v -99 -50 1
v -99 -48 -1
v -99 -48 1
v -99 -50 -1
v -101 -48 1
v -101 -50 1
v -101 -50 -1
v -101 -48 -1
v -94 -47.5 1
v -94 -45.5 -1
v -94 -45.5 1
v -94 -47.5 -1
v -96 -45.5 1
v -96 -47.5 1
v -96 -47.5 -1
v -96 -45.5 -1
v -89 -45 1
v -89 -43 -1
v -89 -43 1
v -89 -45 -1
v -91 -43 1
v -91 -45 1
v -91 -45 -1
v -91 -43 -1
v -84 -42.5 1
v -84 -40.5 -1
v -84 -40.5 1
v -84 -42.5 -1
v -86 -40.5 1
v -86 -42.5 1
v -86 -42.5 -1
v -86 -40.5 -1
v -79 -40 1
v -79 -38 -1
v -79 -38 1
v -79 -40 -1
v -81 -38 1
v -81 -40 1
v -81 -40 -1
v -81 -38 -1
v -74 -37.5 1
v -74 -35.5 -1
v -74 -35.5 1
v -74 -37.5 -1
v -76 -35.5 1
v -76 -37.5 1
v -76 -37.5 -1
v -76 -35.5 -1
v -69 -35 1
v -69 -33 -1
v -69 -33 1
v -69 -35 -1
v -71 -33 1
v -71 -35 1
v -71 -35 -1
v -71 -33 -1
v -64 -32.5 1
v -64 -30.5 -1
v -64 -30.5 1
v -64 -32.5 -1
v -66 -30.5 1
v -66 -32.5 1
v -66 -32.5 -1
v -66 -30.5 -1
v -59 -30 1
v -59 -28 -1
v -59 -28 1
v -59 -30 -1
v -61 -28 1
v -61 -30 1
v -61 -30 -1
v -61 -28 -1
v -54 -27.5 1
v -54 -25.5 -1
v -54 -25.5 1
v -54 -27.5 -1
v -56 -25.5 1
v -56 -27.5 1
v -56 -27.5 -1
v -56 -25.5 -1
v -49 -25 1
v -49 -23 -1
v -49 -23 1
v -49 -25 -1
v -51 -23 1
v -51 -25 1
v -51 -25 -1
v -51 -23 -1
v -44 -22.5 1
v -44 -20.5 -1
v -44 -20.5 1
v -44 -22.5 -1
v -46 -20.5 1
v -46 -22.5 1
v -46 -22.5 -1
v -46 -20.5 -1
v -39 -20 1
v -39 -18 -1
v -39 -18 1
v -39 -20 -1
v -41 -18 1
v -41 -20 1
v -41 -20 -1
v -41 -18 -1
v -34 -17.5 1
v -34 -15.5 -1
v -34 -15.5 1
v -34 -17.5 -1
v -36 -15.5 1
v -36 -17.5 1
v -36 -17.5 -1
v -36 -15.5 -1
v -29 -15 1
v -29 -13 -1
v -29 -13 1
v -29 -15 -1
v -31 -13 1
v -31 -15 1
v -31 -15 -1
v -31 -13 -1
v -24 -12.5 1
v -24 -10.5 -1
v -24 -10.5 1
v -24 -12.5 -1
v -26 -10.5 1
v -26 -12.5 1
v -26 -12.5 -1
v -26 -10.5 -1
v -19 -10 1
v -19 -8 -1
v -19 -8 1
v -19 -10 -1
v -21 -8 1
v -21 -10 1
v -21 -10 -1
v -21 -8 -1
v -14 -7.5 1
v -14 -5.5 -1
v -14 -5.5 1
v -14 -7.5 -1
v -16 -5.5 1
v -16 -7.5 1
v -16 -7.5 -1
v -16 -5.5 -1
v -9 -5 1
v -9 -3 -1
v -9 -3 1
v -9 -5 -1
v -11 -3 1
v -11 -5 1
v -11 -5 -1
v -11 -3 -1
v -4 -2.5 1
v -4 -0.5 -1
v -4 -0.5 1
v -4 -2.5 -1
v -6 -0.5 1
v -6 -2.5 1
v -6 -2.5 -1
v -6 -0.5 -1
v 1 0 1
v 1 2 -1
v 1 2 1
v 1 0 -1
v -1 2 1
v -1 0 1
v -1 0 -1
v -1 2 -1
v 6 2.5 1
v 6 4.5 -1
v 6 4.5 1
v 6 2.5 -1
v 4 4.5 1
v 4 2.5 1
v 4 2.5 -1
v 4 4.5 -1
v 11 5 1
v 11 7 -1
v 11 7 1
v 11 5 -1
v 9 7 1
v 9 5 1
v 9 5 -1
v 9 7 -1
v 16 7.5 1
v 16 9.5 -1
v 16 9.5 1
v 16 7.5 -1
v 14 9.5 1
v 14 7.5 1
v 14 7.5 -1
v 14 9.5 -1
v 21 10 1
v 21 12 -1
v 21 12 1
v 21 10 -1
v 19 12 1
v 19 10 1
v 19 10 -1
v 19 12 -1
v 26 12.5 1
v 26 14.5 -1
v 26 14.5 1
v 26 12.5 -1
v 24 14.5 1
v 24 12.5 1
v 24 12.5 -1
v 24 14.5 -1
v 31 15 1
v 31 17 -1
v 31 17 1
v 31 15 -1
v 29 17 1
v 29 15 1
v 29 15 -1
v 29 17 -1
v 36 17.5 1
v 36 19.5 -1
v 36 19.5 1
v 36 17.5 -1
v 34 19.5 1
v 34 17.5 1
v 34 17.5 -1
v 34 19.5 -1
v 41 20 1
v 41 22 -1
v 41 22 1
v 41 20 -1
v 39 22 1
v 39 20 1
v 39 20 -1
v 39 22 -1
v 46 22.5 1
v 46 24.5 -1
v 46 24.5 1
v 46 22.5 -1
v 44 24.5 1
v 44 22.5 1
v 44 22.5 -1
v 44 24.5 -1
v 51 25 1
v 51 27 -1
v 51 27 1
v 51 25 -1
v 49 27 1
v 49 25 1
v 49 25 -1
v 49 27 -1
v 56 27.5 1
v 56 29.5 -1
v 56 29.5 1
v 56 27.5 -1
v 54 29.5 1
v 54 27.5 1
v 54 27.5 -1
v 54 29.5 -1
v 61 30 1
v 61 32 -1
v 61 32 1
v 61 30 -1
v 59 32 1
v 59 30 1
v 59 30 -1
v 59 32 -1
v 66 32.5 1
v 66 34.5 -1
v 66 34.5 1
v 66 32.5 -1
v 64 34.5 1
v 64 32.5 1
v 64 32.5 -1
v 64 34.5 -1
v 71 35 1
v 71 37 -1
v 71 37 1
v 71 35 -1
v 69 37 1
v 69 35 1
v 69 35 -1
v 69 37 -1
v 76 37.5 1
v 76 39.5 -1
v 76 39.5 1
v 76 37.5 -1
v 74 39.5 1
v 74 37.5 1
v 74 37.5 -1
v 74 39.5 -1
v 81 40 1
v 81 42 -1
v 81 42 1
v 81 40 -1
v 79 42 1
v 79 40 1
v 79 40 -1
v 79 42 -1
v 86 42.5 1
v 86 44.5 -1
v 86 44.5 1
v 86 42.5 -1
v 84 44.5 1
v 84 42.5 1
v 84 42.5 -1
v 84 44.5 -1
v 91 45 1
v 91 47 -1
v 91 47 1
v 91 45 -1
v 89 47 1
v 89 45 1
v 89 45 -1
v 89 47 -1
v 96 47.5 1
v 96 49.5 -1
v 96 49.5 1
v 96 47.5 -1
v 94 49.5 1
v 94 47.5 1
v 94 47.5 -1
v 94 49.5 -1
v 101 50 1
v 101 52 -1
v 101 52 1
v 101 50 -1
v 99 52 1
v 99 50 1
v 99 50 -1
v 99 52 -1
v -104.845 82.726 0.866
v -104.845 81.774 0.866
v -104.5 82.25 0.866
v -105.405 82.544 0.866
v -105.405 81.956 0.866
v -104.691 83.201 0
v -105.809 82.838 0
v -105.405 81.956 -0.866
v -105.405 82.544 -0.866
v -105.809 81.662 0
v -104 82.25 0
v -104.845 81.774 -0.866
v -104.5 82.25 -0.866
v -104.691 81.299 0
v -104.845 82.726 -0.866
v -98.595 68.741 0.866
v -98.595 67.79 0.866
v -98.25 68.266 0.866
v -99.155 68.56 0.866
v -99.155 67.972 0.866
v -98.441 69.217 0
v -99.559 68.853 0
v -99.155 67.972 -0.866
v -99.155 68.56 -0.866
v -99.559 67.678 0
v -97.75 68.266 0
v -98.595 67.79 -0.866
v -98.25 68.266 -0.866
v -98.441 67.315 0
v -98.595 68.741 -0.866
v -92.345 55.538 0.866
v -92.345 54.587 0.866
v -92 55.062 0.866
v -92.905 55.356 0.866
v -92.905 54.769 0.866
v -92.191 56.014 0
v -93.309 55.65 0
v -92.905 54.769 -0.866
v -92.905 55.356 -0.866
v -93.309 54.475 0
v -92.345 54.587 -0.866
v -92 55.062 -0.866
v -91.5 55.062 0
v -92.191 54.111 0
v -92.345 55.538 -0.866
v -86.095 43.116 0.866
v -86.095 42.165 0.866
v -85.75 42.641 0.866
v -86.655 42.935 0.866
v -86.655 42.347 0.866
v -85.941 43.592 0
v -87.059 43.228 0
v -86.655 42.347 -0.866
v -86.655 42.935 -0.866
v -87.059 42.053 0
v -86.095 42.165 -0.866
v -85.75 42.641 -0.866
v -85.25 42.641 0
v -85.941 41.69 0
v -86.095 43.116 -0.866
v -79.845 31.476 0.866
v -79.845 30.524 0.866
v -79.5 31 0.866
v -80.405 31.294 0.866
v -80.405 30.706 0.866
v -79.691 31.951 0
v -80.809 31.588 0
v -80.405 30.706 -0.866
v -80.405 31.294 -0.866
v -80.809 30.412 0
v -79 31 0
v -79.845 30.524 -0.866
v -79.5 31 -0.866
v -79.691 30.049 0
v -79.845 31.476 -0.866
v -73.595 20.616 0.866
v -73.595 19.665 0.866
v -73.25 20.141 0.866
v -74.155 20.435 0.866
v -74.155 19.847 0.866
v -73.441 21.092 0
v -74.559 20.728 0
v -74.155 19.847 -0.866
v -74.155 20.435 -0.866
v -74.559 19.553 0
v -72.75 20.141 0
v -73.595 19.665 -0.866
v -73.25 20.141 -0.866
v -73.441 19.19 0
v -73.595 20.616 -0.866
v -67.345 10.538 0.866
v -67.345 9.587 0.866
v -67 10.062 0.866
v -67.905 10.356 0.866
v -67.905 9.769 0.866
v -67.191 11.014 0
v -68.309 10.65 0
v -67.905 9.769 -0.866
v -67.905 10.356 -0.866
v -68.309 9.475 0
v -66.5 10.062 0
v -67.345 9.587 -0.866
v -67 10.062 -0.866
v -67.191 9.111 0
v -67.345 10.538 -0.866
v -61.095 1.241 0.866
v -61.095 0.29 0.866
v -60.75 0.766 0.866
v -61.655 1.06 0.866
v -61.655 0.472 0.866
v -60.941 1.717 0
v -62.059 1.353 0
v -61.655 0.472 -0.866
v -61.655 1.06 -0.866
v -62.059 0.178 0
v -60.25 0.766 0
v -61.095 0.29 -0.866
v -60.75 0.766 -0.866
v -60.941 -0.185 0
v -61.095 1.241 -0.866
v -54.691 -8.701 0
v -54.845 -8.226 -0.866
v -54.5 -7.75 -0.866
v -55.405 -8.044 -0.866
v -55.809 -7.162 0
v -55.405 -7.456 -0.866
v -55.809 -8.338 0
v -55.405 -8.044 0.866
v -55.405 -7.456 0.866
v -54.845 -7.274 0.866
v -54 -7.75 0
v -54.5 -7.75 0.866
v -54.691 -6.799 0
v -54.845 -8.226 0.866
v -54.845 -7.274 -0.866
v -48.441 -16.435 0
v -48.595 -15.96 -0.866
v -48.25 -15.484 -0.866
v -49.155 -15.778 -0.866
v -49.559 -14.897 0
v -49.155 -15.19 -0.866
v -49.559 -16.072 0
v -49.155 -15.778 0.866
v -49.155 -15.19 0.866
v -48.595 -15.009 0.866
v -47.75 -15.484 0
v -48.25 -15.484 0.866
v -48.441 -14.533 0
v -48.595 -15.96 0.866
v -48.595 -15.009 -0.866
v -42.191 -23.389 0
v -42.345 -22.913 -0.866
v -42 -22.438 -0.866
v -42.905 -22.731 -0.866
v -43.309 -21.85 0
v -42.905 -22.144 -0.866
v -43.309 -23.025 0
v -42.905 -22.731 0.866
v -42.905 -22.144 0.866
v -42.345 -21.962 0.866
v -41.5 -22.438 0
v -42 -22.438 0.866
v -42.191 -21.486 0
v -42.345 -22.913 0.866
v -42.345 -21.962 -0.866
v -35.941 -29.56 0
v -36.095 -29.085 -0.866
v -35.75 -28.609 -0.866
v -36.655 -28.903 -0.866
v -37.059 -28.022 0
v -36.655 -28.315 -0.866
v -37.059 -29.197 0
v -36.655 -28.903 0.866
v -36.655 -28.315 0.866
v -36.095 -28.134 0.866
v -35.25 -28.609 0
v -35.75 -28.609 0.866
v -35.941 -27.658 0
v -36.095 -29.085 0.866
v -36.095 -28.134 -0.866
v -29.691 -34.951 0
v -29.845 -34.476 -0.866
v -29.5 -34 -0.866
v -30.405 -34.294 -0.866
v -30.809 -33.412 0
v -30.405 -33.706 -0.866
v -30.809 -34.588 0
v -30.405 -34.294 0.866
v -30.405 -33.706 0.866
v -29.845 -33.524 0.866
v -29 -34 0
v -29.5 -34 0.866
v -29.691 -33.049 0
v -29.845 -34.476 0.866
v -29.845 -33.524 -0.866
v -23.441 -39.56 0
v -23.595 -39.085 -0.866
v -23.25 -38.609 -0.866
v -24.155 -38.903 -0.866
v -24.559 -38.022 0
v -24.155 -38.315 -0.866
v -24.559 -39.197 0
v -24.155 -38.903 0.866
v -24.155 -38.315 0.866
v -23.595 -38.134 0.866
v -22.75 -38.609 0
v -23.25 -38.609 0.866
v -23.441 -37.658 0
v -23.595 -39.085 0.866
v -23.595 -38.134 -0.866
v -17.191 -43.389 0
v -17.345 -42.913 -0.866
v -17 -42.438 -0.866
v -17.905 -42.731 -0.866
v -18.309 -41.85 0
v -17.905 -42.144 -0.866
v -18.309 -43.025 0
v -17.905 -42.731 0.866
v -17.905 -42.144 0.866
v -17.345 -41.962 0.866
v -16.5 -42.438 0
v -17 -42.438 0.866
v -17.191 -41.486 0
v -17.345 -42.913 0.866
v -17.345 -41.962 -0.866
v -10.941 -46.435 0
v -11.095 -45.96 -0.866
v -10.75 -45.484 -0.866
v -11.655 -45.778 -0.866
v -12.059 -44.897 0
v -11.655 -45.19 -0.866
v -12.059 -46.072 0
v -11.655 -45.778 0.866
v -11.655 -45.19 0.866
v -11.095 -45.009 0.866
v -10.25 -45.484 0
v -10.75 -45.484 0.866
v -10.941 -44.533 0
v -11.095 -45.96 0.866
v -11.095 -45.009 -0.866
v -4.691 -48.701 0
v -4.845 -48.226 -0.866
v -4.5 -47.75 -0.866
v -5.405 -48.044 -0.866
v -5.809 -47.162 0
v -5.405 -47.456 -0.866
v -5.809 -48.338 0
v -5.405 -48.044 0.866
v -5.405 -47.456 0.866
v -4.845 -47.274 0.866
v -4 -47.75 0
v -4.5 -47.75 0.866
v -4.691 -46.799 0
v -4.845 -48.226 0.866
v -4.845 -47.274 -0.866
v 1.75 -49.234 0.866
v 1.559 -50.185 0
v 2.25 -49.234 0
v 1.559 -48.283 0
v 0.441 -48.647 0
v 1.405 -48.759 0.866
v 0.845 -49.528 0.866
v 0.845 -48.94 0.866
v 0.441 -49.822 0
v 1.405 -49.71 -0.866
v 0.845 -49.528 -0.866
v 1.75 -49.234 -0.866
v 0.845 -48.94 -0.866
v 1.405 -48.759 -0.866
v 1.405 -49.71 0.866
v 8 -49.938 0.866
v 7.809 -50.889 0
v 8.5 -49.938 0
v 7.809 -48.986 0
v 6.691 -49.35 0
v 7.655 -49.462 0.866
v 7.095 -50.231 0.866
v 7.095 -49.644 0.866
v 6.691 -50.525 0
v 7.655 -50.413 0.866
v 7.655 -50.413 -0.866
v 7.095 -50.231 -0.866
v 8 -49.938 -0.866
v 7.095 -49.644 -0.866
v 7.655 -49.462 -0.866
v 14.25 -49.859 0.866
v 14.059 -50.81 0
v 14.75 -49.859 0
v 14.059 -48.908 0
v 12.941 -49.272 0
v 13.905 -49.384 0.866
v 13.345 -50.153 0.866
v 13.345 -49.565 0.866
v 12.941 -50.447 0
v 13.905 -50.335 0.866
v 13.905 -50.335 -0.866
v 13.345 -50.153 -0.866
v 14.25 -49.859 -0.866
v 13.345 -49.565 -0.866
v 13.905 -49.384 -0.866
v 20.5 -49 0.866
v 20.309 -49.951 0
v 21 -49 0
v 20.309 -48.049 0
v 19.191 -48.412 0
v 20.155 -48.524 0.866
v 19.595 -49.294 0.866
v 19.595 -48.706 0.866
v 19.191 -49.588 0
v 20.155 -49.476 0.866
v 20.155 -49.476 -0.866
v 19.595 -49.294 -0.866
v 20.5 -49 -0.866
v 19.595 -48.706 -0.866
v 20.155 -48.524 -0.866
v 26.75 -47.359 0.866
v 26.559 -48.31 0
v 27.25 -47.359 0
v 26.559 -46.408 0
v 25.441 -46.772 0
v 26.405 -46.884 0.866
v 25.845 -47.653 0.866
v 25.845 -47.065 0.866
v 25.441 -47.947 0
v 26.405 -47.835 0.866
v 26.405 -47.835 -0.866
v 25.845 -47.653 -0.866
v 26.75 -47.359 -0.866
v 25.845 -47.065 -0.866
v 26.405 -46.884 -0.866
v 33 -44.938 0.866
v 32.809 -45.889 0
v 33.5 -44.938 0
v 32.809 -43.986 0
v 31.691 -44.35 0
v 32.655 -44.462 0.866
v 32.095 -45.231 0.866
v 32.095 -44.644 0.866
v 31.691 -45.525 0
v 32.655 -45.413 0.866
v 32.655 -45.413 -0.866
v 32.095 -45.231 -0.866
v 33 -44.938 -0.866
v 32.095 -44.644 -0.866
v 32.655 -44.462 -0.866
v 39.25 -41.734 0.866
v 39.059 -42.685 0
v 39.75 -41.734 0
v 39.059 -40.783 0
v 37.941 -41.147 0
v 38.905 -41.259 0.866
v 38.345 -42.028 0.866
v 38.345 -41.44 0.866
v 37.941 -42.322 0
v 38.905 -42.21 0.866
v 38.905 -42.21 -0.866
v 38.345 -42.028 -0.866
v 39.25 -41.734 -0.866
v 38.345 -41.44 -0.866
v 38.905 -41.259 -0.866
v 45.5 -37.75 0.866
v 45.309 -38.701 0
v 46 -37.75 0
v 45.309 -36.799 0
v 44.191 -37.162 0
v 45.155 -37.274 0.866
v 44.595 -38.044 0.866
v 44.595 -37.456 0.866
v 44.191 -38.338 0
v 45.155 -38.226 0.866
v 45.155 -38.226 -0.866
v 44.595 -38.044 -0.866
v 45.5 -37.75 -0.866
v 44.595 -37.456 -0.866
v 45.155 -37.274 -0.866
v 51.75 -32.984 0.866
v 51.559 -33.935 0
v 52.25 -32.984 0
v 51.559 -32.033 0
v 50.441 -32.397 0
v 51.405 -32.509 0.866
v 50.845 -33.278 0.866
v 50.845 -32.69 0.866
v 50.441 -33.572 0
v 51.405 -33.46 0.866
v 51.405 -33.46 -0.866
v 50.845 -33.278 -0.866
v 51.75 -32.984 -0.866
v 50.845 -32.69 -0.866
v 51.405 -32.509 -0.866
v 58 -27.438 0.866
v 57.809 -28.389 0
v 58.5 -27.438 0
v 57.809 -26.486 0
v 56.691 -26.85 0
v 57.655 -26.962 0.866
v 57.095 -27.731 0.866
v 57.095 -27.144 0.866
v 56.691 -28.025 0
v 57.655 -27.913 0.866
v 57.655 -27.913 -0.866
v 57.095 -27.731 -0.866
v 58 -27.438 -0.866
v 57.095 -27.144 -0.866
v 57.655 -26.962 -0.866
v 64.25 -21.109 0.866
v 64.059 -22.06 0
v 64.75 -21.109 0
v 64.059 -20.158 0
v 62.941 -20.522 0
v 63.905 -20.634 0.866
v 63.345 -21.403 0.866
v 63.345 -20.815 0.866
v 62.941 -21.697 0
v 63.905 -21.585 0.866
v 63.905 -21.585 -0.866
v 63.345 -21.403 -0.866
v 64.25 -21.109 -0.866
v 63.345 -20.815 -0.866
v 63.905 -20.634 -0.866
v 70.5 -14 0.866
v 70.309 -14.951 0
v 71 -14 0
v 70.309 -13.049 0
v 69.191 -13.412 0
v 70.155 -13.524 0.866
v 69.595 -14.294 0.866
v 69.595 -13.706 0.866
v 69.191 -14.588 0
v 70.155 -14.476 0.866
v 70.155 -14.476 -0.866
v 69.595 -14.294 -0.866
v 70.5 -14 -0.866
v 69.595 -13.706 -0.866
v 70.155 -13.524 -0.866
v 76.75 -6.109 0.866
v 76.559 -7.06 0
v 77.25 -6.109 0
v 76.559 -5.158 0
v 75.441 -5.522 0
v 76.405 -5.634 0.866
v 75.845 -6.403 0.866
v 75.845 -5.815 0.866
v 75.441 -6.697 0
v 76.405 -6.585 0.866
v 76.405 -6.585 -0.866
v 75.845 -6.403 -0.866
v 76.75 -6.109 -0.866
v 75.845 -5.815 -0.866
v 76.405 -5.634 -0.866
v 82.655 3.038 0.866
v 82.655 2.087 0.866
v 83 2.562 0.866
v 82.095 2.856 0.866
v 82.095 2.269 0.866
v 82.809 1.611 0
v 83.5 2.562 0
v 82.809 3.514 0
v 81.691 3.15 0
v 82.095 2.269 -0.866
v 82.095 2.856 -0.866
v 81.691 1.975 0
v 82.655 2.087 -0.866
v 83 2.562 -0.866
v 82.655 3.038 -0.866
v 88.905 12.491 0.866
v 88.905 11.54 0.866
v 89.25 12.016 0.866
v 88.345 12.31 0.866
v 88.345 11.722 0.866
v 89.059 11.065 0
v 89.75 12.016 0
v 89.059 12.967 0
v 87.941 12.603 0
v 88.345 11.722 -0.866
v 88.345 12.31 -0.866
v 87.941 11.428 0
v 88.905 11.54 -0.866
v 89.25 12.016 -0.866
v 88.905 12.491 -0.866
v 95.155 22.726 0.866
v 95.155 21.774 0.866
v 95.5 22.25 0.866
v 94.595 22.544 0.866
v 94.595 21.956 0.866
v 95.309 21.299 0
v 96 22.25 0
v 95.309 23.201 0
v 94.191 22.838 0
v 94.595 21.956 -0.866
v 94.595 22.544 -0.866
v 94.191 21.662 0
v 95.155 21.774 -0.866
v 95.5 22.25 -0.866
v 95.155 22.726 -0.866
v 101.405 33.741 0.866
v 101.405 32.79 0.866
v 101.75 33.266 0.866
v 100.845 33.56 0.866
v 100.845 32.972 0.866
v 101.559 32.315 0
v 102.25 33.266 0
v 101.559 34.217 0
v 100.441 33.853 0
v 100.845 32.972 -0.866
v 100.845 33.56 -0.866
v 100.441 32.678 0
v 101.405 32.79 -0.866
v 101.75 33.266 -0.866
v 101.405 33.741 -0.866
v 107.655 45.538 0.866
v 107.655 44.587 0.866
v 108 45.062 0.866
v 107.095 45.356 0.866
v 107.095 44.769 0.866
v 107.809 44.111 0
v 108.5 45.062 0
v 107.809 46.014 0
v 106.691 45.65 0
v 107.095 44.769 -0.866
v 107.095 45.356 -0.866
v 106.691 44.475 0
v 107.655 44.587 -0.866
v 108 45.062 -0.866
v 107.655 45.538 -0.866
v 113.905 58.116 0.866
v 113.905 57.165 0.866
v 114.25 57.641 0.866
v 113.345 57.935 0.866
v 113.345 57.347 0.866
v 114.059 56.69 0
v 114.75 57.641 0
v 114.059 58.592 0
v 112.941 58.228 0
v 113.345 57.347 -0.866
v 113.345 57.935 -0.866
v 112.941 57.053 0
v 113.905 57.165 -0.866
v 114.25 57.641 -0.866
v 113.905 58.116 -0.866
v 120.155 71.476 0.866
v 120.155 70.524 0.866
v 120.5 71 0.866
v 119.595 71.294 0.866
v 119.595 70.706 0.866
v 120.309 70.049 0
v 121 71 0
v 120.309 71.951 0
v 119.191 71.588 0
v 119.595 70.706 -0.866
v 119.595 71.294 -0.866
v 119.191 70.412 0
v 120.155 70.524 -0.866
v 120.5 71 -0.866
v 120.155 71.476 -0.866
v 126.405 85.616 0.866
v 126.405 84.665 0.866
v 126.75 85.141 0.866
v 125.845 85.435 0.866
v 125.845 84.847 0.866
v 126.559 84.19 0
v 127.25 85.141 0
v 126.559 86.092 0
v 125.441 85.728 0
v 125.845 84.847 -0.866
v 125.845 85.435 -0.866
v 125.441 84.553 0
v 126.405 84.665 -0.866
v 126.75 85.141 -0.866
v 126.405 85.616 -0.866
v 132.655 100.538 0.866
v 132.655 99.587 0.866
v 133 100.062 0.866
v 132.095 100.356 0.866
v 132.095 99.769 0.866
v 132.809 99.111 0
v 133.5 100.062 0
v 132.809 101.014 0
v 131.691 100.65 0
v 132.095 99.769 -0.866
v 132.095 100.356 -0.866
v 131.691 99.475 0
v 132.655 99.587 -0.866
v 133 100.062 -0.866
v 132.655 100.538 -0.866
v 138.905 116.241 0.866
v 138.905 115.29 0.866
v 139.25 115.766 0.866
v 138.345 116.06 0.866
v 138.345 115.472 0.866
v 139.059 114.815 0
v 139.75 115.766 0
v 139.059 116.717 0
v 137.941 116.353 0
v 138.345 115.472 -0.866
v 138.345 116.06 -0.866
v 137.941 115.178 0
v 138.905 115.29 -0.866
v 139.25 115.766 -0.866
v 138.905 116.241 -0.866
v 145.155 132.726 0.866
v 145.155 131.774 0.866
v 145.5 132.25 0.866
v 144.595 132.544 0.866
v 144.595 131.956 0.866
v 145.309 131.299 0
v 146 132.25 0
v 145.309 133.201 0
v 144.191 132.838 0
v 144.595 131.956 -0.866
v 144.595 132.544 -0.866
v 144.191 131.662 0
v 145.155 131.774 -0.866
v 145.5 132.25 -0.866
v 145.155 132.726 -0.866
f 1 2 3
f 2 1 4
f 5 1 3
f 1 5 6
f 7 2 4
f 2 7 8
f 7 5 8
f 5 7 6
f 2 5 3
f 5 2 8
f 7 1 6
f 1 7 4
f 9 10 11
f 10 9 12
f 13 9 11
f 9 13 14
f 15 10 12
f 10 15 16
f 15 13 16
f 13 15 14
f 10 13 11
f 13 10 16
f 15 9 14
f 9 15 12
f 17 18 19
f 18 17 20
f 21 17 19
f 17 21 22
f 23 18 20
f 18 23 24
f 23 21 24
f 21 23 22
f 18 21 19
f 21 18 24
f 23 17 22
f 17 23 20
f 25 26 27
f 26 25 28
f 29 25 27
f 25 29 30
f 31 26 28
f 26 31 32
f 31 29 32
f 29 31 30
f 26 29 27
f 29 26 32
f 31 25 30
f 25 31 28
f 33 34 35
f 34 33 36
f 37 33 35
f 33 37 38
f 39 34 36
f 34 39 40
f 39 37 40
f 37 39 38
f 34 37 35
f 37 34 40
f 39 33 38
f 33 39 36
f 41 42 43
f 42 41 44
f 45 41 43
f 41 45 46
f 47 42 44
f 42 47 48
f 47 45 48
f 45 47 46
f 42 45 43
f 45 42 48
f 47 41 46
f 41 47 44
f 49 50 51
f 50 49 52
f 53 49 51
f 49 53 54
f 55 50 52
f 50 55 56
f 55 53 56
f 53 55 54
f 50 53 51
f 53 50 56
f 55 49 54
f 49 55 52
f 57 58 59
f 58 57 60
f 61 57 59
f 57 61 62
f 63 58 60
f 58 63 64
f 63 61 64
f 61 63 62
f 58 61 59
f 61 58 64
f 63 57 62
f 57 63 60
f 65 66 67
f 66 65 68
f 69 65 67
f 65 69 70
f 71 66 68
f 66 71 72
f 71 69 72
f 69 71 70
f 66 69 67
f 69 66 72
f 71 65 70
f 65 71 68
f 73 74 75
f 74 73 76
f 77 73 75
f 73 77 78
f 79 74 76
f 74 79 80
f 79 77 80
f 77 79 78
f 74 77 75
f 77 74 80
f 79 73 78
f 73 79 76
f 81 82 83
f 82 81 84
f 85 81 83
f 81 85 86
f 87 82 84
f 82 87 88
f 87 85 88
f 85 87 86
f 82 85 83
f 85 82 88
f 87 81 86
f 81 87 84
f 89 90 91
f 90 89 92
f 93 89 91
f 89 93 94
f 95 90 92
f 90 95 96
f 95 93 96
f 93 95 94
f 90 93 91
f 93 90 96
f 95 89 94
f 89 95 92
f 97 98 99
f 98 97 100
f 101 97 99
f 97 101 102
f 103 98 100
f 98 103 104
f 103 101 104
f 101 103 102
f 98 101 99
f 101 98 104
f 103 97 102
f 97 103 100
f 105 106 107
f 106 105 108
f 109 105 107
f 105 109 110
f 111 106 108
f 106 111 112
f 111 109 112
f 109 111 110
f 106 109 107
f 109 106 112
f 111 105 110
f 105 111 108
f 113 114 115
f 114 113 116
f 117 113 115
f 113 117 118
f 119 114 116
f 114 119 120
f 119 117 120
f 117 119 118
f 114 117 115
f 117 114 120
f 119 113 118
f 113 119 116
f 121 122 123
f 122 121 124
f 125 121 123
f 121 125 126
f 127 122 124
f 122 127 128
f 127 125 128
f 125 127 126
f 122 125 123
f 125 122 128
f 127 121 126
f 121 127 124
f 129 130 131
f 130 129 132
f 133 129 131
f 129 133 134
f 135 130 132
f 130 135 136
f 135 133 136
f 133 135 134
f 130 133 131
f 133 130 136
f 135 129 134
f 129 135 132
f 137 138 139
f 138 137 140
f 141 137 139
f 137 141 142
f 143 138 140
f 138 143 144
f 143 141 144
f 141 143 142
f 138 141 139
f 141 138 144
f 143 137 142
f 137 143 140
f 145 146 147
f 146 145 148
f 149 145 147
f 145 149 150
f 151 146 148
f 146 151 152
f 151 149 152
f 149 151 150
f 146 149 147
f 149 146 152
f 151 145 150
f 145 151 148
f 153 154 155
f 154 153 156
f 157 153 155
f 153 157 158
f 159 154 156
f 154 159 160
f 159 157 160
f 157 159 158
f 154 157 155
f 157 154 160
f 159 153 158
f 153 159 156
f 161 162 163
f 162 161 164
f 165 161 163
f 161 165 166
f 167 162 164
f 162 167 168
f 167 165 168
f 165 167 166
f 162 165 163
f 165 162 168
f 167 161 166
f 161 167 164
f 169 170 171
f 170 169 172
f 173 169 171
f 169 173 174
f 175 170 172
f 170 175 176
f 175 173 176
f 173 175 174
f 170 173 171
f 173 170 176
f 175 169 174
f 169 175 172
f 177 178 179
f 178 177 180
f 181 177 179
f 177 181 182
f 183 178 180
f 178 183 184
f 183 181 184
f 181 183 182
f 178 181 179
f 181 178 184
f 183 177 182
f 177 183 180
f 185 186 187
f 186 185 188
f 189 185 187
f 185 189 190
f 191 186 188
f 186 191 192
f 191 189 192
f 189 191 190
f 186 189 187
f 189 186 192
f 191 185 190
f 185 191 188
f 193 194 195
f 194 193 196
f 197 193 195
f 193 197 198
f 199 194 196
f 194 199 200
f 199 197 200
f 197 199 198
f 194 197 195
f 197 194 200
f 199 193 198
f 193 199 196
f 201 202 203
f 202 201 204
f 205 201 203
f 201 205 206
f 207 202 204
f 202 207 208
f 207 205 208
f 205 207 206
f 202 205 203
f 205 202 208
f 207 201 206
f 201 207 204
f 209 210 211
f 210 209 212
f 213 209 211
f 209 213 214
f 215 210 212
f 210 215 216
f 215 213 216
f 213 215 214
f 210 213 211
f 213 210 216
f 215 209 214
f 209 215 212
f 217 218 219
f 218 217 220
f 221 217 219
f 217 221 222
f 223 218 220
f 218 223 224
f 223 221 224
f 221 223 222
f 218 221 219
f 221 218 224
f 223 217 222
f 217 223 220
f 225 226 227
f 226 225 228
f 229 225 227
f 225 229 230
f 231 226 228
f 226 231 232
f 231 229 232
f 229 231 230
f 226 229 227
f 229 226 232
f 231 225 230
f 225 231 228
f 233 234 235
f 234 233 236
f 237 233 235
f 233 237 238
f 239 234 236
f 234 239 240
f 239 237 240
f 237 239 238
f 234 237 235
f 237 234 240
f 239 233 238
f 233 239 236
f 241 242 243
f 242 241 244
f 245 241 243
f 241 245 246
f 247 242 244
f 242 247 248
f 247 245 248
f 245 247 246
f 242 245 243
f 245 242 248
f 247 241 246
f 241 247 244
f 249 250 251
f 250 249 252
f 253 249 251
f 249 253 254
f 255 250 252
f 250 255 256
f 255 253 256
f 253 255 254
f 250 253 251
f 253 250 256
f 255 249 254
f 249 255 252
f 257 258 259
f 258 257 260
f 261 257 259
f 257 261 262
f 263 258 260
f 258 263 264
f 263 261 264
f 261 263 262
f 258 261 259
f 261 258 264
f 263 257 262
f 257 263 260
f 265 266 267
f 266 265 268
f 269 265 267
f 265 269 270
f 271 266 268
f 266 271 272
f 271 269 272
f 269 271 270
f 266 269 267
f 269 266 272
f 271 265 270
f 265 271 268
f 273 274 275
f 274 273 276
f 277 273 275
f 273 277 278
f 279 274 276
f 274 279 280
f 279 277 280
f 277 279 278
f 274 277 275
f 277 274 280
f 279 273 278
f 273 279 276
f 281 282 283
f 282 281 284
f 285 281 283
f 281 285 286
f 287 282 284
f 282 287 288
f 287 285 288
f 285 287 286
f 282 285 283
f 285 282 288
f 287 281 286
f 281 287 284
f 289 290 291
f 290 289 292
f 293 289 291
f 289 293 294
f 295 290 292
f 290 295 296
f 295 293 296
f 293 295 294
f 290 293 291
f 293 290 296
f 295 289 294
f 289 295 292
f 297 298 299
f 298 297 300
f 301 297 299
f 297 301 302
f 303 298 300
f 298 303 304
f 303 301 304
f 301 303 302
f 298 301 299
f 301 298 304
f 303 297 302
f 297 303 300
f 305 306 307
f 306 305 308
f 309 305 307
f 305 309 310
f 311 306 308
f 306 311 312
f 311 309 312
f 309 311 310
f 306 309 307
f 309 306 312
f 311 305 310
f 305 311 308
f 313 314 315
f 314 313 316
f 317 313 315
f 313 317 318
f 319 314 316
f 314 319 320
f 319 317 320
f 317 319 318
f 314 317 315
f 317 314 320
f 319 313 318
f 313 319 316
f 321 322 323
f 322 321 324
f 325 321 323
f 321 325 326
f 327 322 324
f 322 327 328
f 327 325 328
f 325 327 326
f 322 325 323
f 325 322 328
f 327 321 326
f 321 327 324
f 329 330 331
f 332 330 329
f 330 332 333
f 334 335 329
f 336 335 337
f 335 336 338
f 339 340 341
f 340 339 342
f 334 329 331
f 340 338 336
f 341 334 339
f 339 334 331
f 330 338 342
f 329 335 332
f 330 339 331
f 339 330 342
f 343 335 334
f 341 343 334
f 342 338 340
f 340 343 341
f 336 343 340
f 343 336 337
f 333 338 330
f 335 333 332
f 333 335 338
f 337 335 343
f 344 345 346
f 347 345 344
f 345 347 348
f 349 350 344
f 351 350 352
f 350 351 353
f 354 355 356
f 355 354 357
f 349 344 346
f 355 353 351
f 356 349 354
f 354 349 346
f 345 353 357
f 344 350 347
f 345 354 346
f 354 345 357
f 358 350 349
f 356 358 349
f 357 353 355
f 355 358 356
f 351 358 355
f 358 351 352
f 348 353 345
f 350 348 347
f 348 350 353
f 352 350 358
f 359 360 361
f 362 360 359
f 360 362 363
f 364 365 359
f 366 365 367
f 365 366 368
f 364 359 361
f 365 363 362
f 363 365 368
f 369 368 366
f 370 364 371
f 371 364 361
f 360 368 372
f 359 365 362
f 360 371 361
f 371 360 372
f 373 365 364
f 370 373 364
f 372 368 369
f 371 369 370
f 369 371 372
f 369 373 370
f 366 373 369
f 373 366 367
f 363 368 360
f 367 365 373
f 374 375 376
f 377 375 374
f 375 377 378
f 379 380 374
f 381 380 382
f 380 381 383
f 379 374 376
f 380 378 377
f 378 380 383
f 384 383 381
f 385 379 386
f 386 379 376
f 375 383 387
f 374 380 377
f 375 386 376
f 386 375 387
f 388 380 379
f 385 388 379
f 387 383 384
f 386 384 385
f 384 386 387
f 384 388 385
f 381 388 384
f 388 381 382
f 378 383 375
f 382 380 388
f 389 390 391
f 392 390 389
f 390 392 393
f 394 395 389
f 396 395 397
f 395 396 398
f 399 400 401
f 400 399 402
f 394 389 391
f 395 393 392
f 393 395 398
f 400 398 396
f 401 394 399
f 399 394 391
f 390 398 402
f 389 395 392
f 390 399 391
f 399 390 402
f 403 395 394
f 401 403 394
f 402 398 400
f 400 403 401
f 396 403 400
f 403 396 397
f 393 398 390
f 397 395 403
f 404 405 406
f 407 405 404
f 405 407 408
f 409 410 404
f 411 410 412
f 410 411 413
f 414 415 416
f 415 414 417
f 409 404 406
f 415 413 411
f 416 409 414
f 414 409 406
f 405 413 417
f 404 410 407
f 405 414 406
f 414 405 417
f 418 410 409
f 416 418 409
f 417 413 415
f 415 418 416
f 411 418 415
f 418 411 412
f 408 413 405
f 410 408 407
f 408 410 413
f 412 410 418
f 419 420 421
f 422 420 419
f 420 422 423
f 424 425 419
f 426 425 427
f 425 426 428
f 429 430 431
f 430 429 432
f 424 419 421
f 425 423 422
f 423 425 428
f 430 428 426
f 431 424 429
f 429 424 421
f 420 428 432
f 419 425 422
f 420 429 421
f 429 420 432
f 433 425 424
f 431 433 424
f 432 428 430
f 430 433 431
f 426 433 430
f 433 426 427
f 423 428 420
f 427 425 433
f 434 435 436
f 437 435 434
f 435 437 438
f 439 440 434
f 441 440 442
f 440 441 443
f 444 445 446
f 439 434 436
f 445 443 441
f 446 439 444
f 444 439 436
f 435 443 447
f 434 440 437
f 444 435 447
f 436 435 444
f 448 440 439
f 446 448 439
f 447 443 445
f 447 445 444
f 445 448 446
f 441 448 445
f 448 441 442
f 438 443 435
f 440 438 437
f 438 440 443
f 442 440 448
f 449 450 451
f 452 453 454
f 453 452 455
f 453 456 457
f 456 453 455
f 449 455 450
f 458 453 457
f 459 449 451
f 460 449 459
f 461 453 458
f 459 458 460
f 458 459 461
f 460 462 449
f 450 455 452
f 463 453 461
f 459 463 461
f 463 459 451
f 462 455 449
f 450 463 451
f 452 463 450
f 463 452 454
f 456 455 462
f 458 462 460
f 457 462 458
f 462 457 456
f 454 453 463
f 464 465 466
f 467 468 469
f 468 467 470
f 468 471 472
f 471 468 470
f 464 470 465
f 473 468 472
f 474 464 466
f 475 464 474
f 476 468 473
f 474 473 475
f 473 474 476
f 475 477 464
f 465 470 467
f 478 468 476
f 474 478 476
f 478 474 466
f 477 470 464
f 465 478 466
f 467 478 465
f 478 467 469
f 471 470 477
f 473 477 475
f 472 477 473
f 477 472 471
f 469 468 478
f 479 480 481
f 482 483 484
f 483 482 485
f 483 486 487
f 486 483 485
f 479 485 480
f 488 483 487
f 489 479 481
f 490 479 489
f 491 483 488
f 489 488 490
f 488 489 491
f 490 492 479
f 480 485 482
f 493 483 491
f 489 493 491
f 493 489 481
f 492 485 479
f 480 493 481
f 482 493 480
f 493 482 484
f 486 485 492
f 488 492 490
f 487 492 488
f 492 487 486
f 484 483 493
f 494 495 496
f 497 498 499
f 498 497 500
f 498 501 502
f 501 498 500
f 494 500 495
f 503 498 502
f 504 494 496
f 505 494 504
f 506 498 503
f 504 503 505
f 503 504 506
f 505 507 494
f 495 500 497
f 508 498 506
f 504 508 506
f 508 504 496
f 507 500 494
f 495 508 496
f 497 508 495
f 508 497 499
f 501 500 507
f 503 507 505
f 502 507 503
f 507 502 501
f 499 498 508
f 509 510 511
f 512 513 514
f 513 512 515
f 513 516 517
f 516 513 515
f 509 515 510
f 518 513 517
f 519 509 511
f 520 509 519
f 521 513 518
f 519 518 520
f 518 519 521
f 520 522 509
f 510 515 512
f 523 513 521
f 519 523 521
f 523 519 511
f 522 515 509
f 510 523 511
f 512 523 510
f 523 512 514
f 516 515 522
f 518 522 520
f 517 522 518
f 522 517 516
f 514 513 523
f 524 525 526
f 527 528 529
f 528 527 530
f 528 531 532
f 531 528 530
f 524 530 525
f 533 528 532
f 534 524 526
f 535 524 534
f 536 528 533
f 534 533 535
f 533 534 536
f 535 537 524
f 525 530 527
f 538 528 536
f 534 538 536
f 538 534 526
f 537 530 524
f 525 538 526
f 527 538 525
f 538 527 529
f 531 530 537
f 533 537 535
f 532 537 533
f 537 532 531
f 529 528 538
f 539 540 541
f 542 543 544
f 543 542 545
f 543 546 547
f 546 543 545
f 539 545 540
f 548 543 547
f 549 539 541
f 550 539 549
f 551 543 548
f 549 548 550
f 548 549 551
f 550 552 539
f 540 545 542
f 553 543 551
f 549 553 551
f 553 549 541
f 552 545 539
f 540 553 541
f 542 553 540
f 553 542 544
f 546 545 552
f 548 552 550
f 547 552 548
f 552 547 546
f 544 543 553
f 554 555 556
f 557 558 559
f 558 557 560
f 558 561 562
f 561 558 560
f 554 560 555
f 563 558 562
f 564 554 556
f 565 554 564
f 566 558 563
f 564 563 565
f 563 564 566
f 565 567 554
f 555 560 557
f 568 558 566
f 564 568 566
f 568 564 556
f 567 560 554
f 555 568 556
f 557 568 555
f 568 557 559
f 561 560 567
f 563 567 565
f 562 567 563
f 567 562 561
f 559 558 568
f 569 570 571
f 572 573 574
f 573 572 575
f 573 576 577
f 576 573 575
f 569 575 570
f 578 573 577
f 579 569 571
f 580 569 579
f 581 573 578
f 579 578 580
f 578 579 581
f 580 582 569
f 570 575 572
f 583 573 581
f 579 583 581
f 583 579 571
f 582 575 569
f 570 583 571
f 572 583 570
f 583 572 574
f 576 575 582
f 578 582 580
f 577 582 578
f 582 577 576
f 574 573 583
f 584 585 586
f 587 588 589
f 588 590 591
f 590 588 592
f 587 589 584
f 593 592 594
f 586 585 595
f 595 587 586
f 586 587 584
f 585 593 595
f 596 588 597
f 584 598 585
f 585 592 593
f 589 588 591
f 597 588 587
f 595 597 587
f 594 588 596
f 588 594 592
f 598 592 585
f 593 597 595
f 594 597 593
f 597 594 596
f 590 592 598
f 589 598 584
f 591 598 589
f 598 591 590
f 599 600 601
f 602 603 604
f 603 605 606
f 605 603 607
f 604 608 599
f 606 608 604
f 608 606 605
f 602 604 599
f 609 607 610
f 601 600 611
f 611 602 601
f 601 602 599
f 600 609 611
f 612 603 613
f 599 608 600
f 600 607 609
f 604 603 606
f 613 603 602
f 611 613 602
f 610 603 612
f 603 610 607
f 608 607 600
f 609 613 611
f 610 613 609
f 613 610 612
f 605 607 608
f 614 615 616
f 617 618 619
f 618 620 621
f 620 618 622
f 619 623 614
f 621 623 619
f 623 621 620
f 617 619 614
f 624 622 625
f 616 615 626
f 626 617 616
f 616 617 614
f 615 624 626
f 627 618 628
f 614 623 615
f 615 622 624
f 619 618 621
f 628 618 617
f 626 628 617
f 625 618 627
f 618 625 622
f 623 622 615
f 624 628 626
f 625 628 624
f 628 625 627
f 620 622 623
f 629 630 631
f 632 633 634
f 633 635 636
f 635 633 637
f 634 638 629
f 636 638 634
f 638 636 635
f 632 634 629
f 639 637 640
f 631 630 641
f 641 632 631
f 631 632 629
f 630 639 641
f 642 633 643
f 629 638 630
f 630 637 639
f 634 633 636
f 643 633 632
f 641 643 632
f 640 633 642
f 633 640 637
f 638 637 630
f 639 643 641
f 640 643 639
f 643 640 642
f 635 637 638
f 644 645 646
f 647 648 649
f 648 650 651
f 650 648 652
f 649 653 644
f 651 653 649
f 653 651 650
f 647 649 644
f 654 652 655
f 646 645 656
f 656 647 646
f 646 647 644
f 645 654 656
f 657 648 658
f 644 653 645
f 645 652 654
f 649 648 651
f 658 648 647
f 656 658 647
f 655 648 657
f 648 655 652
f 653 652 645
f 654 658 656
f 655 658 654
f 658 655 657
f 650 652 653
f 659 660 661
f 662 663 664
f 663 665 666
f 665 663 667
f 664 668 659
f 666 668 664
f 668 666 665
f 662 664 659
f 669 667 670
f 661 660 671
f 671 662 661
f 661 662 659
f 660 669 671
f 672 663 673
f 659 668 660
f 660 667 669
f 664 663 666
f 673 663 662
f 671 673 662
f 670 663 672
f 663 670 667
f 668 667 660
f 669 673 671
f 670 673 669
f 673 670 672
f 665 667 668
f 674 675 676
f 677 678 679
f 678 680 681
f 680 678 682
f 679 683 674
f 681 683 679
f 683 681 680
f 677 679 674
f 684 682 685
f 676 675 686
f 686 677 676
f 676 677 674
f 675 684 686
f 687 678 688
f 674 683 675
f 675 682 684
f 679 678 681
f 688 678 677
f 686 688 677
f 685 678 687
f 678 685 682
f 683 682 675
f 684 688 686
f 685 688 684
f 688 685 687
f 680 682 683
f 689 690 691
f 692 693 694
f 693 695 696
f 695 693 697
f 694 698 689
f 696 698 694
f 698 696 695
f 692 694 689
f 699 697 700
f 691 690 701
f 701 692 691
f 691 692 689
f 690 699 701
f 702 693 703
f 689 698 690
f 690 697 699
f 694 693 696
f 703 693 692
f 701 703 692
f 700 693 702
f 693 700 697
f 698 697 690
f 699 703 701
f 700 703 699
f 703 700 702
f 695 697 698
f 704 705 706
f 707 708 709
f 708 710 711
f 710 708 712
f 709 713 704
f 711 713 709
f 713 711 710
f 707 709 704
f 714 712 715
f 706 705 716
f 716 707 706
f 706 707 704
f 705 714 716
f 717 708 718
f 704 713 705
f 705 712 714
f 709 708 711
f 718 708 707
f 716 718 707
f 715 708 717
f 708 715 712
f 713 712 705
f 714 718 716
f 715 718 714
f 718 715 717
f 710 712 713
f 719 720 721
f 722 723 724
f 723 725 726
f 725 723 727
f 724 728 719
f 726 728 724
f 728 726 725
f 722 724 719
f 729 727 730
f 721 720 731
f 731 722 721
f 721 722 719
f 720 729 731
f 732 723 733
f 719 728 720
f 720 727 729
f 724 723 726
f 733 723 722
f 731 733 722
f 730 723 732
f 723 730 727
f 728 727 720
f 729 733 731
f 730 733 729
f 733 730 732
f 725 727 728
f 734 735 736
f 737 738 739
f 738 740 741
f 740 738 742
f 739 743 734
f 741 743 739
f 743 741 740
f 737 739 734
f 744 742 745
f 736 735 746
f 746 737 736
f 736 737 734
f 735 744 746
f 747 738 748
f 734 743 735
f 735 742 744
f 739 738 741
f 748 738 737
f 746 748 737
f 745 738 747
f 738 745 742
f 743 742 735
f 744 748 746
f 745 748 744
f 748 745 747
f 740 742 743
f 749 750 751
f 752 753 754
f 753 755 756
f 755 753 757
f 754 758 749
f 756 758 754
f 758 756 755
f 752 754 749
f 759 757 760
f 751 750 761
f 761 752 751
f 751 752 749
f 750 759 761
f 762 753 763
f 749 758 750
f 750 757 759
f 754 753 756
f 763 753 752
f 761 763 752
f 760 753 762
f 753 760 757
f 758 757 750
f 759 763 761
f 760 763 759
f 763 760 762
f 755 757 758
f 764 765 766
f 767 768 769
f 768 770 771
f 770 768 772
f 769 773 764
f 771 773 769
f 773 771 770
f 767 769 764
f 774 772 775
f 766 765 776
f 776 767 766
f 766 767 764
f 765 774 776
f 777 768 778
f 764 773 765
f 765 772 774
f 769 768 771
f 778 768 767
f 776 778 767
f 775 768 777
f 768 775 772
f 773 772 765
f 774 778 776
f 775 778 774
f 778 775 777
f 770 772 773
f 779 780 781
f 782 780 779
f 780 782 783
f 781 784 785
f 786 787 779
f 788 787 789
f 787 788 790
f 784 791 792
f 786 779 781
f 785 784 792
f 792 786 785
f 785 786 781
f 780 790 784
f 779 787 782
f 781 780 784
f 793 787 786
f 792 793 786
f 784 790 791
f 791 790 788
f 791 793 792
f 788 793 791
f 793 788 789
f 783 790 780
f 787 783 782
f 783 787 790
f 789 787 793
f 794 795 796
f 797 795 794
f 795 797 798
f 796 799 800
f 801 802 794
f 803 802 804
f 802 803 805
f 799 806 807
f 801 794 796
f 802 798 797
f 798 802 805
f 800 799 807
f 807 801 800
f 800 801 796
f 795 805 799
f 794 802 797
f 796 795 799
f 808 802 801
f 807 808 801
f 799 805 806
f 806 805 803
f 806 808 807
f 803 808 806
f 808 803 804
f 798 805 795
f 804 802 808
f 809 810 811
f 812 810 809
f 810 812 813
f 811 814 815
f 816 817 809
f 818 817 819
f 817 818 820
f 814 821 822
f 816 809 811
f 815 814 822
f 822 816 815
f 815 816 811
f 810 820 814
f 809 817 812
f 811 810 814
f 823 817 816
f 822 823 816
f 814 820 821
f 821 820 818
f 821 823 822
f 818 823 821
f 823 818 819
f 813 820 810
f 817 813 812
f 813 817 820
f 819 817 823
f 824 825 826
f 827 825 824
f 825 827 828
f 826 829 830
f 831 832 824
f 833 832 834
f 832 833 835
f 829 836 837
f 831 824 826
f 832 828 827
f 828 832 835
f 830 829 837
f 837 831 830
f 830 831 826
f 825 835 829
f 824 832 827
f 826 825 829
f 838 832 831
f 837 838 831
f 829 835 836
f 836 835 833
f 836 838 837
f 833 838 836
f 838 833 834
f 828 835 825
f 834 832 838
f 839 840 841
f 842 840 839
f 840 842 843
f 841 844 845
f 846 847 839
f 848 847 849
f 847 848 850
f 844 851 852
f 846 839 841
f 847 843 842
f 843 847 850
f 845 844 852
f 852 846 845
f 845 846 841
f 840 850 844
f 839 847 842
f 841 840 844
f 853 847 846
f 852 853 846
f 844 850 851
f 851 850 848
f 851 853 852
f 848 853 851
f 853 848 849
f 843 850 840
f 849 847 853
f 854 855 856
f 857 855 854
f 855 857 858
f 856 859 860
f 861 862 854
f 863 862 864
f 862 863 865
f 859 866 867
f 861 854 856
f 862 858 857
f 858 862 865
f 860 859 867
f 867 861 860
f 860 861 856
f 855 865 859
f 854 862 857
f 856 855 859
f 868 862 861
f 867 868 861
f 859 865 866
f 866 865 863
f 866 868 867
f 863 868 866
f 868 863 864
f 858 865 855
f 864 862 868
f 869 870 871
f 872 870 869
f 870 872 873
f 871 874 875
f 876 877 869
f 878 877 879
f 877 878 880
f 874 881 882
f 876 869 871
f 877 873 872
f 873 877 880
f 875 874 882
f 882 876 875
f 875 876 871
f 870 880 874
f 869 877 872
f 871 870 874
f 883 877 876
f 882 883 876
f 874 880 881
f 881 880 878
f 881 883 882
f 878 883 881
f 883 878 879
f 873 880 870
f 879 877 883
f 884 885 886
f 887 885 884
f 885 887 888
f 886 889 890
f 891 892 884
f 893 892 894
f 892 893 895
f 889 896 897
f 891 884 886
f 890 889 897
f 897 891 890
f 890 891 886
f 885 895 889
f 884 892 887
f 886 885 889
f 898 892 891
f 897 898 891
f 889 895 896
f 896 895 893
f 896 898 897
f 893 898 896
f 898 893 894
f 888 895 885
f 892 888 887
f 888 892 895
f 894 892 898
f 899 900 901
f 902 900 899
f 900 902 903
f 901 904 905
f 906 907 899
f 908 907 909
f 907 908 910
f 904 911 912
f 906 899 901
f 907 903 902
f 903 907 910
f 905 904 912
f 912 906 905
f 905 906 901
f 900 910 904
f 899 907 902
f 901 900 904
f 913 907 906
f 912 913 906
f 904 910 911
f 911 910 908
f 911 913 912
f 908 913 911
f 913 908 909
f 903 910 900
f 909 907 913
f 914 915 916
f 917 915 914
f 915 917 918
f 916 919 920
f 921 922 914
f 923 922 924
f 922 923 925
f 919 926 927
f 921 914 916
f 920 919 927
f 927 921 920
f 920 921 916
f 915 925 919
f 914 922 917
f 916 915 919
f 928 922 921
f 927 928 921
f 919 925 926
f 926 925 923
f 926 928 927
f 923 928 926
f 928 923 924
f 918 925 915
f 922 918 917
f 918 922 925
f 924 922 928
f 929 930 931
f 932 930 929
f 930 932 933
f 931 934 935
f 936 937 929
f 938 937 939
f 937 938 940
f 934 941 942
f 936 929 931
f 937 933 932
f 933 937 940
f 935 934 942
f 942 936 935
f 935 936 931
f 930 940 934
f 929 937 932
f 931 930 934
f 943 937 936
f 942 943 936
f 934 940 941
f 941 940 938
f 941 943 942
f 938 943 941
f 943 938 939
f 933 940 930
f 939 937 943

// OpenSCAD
echo(version=version());

// Functions can be defined to simplify code using lots of
// calculations.

// Simple example with a single function argument (which should
// be a number) and returning a number calculated based on that.
function f(x) = 0.5 * x + 1;

color("red")
    for (a = [ -100 : 5 : 100 ])
        translate([a, f(a), 0]) cube(2, center = true);

// Functions can call other functions and return complex values
// too. In this case a 3 element vector is returned which can
// be used as point in 3D space or as vector (in the mathematical
// meaning) for translations and other transformations.
function g(x) = [ 5 * x + 20, f(x) * f(x) - 50, 0 ];

color("green")
    for (a = [ -200 : 10 : 200 ])
        translate(g(a / 8)) sphere(1);



// Written in 2015 by Torsten Paul <Torsten.Paul@gmx.de>
//
// To the extent possible under law, the author(s) have dedicated all
// copyright and related and neighboring rights to this software to the
// public domain worldwide. This software is distributed without any
// warranty.
//
// You should have received a copy of the CC0 Public Domain
// Dedication along with this software.
// If not, see <http://creativecommons.org/publicdomain/zero/1.0/>.
